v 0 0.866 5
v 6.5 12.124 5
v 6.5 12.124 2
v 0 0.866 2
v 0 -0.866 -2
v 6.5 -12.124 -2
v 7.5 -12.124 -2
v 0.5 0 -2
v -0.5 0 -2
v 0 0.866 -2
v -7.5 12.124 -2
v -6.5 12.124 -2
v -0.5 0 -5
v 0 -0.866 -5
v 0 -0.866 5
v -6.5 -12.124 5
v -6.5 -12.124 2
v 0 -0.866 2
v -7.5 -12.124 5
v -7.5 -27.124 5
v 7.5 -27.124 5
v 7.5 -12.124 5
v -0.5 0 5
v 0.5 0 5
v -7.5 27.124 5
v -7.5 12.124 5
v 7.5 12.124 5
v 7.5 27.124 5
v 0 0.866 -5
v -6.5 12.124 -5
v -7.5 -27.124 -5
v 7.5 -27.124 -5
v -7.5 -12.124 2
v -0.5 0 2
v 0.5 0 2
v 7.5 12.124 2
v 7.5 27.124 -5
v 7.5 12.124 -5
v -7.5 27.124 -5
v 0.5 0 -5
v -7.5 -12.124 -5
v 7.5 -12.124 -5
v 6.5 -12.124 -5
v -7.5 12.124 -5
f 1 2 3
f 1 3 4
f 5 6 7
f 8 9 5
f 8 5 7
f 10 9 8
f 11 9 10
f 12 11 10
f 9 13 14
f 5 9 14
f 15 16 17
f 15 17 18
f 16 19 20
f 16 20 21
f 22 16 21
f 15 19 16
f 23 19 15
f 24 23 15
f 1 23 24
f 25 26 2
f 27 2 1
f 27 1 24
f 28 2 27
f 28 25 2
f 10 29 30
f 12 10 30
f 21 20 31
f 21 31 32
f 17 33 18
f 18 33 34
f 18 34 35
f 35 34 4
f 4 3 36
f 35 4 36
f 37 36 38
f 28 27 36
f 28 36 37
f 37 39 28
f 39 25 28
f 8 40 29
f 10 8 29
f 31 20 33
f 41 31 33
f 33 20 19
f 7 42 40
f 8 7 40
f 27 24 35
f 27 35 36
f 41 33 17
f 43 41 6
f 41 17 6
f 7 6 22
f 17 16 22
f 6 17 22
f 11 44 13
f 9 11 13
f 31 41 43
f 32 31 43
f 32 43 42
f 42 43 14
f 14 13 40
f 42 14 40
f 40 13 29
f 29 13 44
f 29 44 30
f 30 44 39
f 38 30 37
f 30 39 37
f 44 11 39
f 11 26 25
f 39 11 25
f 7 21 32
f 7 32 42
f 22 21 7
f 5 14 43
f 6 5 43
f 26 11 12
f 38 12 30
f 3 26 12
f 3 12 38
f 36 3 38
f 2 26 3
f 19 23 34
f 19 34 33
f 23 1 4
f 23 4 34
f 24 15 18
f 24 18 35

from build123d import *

# Parameters (mm, degrees)
SKETCH1_W             = 15
SKETCH1_H             = 15
BOSS_EXTRUDE1_DEPTH   = 5
BOSS_EXTRUDE1_2_DEPTH = 5
BOSS_EXTRUDE2_START   = 5
BOSS_EXTRUDE2_DEPTH   = 3
BOSS_EXTRUDE3_START   = -5
BOSS_EXTRUDE3_DEPTH   = 3


with BuildPart() as part:
    # Sketch1 → Boss-Extrude1 (new, symmetric)
    with BuildSketch(Plane.XY):
        with Locations((0, 19.624355653)):
            Rectangle(SKETCH1_W, SKETCH1_H)
    extrude(amount=BOSS_EXTRUDE1_DEPTH, both=True)



with BuildPart() as body_2:
    # Sketch1 → Boss-Extrude1 2 (new, symmetric)
    with BuildSketch(Plane.XY):
        with Locations((0, -19.624355653)):
            Rectangle(SKETCH1_W, SKETCH1_H)
    extrude(amount=BOSS_EXTRUDE1_2_DEPTH, both=True)


with BuildPart() as part_1:
    add(part.part)

    add(body_2.part)  # Boss-Extrude2 merges body 2
    # Sketch1<3> → Boss-Extrude2 (add)
    with BuildSketch(Plane.XY.offset(BOSS_EXTRUDE2_START)):
        Polygon((-6.5, -12.124355653), (0, -0.866025404), (-0.5, 0), (-7.5, -12.124355653), align=None)
        Polygon((0.5, 0), (7.5, 12.124355653), (6.5, 12.124355653), (0, 0.866025404), align=None)
        Polygon((0, -0.866025404), (0.5, 0), (0, 0.866025404), (-0.5, 0), align=None)
    extrude(amount=-BOSS_EXTRUDE2_DEPTH)

    # Sketch1<4> → Boss-Extrude3 (add)
    with BuildSketch(Plane.XY.offset(BOSS_EXTRUDE3_START)):
        Polygon((0, 0.866025404), (-6.5, 12.124355653), (-7.5, 12.124355653), (-0.5, 0), align=None)
        Polygon((7.5, -12.124355653), (0.5, 0), (0, -0.866025404), (6.5, -12.124355653), align=None)
        Polygon((0, -0.866025404), (0.5, 0), (0, 0.866025404), (-0.5, 0), align=None)
    extrude(amount=BOSS_EXTRUDE3_DEPTH)


solid = part_1.part
